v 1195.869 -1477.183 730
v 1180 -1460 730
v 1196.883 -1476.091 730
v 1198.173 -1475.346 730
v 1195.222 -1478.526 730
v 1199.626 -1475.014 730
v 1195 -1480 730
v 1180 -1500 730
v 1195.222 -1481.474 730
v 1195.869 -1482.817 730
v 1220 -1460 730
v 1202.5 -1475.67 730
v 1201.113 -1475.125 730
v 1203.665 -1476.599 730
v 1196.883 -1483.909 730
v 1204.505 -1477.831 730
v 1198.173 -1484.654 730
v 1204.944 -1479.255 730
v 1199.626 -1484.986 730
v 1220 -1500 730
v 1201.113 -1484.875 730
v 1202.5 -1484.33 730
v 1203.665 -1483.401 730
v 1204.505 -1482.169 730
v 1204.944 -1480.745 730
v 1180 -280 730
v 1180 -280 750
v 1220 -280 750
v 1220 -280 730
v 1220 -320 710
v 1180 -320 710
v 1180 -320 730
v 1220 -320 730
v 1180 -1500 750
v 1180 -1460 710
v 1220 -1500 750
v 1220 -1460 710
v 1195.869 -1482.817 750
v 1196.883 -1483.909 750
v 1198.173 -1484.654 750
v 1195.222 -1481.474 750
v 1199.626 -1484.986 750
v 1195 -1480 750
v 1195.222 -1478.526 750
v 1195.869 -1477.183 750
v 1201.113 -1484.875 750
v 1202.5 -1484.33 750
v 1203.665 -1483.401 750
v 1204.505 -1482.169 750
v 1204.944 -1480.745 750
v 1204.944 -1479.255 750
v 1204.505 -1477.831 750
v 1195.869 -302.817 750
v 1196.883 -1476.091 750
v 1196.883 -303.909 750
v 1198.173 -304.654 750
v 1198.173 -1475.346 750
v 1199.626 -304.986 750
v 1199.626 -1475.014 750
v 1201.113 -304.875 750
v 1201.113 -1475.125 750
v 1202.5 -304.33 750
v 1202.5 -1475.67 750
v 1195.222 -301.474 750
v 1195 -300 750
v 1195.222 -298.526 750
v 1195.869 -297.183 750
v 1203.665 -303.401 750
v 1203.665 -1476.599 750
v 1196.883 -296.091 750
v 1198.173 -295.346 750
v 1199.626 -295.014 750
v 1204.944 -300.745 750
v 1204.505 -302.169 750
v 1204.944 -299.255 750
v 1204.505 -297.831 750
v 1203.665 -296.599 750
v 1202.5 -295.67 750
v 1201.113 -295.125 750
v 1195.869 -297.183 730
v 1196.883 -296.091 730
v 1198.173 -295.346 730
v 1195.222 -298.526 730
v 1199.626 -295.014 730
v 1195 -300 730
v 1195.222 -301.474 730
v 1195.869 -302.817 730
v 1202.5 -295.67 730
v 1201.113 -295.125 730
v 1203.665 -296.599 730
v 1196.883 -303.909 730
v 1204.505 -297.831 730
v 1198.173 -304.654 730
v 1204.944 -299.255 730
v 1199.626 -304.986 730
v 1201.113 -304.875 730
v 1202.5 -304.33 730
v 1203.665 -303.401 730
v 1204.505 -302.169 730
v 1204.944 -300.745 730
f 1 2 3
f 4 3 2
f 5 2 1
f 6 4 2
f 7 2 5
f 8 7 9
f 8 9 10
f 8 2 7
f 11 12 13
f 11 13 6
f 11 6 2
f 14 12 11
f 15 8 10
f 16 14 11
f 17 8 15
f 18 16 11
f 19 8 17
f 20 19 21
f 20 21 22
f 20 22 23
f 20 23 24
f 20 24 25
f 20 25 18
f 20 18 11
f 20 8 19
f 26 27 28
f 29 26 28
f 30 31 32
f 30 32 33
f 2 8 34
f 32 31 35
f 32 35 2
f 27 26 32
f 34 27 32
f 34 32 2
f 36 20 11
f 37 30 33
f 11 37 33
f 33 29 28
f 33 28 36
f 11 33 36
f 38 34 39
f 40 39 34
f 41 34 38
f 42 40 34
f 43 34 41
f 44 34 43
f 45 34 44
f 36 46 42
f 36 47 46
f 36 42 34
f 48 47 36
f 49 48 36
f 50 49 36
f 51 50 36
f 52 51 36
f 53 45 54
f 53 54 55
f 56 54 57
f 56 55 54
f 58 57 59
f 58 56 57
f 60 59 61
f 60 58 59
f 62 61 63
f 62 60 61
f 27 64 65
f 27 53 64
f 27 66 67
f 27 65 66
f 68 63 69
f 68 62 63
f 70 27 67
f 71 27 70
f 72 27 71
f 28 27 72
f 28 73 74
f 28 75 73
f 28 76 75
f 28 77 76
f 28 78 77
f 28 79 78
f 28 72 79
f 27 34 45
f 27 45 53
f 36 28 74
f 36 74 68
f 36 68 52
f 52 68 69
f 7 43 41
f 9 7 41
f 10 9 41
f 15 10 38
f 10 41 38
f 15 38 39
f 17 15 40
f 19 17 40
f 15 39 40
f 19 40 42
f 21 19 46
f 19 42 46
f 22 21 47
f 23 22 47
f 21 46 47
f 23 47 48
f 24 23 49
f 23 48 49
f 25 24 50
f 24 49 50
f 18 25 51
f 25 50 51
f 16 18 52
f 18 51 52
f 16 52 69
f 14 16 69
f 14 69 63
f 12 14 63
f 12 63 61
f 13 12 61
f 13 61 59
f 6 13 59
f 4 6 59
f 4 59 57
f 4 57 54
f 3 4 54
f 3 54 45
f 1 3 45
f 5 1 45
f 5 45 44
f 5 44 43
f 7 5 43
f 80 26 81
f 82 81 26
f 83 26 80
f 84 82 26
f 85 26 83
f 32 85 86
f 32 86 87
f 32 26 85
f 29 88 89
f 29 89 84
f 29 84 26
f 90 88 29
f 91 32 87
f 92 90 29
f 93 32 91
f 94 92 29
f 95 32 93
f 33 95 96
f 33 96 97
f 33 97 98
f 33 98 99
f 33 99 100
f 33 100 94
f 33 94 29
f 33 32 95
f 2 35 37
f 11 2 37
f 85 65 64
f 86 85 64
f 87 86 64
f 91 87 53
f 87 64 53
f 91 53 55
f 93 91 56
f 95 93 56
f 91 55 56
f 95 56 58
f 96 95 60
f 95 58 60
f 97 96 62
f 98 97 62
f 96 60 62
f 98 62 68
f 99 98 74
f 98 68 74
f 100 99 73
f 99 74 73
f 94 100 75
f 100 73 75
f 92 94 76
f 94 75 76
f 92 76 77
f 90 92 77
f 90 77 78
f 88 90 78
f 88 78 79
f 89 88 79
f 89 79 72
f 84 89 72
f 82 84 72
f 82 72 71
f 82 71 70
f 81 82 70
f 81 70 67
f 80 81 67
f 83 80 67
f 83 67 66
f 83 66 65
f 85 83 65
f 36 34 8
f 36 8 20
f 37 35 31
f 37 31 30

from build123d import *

# Parameters (mm, degrees)
SKETCH065_W     = 40
SKETCH065_H     = 40
PAD035_DEPTH    = 1220
SKETCH066_W     = 40
SKETCH066_H     = 40
POCKET020_DEPTH = 20
SKETCH067_R     = 5
POCKET021_DEPTH = 40.001


with BuildPart() as part:
    # Sketch065 → Pad035 (new body)
    with BuildSketch(Plane.XZ.offset(280)):
        with Locations((1200, 280)):
            Rectangle(SKETCH065_W, SKETCH065_H)
    extrude(amount=PAD035_DEPTH)

    # Sketch066 (on Face3 of Pad035) → Pocket020 (cut)
    with BuildSketch(Plane(origin=(0, 0, 260), x_dir=(1, 0, 0), z_dir=(0, 0, -1))):
        with Locations((1200, 1480)):
            Rectangle(SKETCH066_W, SKETCH066_H)
        with Locations((1200, 300)):
            Rectangle(SKETCH066_W, SKETCH066_H)
    extrude(amount=-POCKET020_DEPTH, mode=Mode.SUBTRACT)

    # Sketch067 (on Face1 of Pocket020) → Pocket021 (cut, through all)
    with BuildSketch(Plane(origin=(0, 0, 300), x_dir=(-1, 0, 0), z_dir=(0, 0, 1))):
        with Locations((-1200, 1480)):
            Circle(SKETCH067_R)
        with Locations((-1200, 300)):
            Circle(SKETCH067_R)
    extrude(amount=-POCKET021_DEPTH, mode=Mode.SUBTRACT)


with BuildPart() as part_1:
    # Clone015 placement: moved
    add(part.part.moved(Location((0, 0, 450))))


solid = part_1.part
